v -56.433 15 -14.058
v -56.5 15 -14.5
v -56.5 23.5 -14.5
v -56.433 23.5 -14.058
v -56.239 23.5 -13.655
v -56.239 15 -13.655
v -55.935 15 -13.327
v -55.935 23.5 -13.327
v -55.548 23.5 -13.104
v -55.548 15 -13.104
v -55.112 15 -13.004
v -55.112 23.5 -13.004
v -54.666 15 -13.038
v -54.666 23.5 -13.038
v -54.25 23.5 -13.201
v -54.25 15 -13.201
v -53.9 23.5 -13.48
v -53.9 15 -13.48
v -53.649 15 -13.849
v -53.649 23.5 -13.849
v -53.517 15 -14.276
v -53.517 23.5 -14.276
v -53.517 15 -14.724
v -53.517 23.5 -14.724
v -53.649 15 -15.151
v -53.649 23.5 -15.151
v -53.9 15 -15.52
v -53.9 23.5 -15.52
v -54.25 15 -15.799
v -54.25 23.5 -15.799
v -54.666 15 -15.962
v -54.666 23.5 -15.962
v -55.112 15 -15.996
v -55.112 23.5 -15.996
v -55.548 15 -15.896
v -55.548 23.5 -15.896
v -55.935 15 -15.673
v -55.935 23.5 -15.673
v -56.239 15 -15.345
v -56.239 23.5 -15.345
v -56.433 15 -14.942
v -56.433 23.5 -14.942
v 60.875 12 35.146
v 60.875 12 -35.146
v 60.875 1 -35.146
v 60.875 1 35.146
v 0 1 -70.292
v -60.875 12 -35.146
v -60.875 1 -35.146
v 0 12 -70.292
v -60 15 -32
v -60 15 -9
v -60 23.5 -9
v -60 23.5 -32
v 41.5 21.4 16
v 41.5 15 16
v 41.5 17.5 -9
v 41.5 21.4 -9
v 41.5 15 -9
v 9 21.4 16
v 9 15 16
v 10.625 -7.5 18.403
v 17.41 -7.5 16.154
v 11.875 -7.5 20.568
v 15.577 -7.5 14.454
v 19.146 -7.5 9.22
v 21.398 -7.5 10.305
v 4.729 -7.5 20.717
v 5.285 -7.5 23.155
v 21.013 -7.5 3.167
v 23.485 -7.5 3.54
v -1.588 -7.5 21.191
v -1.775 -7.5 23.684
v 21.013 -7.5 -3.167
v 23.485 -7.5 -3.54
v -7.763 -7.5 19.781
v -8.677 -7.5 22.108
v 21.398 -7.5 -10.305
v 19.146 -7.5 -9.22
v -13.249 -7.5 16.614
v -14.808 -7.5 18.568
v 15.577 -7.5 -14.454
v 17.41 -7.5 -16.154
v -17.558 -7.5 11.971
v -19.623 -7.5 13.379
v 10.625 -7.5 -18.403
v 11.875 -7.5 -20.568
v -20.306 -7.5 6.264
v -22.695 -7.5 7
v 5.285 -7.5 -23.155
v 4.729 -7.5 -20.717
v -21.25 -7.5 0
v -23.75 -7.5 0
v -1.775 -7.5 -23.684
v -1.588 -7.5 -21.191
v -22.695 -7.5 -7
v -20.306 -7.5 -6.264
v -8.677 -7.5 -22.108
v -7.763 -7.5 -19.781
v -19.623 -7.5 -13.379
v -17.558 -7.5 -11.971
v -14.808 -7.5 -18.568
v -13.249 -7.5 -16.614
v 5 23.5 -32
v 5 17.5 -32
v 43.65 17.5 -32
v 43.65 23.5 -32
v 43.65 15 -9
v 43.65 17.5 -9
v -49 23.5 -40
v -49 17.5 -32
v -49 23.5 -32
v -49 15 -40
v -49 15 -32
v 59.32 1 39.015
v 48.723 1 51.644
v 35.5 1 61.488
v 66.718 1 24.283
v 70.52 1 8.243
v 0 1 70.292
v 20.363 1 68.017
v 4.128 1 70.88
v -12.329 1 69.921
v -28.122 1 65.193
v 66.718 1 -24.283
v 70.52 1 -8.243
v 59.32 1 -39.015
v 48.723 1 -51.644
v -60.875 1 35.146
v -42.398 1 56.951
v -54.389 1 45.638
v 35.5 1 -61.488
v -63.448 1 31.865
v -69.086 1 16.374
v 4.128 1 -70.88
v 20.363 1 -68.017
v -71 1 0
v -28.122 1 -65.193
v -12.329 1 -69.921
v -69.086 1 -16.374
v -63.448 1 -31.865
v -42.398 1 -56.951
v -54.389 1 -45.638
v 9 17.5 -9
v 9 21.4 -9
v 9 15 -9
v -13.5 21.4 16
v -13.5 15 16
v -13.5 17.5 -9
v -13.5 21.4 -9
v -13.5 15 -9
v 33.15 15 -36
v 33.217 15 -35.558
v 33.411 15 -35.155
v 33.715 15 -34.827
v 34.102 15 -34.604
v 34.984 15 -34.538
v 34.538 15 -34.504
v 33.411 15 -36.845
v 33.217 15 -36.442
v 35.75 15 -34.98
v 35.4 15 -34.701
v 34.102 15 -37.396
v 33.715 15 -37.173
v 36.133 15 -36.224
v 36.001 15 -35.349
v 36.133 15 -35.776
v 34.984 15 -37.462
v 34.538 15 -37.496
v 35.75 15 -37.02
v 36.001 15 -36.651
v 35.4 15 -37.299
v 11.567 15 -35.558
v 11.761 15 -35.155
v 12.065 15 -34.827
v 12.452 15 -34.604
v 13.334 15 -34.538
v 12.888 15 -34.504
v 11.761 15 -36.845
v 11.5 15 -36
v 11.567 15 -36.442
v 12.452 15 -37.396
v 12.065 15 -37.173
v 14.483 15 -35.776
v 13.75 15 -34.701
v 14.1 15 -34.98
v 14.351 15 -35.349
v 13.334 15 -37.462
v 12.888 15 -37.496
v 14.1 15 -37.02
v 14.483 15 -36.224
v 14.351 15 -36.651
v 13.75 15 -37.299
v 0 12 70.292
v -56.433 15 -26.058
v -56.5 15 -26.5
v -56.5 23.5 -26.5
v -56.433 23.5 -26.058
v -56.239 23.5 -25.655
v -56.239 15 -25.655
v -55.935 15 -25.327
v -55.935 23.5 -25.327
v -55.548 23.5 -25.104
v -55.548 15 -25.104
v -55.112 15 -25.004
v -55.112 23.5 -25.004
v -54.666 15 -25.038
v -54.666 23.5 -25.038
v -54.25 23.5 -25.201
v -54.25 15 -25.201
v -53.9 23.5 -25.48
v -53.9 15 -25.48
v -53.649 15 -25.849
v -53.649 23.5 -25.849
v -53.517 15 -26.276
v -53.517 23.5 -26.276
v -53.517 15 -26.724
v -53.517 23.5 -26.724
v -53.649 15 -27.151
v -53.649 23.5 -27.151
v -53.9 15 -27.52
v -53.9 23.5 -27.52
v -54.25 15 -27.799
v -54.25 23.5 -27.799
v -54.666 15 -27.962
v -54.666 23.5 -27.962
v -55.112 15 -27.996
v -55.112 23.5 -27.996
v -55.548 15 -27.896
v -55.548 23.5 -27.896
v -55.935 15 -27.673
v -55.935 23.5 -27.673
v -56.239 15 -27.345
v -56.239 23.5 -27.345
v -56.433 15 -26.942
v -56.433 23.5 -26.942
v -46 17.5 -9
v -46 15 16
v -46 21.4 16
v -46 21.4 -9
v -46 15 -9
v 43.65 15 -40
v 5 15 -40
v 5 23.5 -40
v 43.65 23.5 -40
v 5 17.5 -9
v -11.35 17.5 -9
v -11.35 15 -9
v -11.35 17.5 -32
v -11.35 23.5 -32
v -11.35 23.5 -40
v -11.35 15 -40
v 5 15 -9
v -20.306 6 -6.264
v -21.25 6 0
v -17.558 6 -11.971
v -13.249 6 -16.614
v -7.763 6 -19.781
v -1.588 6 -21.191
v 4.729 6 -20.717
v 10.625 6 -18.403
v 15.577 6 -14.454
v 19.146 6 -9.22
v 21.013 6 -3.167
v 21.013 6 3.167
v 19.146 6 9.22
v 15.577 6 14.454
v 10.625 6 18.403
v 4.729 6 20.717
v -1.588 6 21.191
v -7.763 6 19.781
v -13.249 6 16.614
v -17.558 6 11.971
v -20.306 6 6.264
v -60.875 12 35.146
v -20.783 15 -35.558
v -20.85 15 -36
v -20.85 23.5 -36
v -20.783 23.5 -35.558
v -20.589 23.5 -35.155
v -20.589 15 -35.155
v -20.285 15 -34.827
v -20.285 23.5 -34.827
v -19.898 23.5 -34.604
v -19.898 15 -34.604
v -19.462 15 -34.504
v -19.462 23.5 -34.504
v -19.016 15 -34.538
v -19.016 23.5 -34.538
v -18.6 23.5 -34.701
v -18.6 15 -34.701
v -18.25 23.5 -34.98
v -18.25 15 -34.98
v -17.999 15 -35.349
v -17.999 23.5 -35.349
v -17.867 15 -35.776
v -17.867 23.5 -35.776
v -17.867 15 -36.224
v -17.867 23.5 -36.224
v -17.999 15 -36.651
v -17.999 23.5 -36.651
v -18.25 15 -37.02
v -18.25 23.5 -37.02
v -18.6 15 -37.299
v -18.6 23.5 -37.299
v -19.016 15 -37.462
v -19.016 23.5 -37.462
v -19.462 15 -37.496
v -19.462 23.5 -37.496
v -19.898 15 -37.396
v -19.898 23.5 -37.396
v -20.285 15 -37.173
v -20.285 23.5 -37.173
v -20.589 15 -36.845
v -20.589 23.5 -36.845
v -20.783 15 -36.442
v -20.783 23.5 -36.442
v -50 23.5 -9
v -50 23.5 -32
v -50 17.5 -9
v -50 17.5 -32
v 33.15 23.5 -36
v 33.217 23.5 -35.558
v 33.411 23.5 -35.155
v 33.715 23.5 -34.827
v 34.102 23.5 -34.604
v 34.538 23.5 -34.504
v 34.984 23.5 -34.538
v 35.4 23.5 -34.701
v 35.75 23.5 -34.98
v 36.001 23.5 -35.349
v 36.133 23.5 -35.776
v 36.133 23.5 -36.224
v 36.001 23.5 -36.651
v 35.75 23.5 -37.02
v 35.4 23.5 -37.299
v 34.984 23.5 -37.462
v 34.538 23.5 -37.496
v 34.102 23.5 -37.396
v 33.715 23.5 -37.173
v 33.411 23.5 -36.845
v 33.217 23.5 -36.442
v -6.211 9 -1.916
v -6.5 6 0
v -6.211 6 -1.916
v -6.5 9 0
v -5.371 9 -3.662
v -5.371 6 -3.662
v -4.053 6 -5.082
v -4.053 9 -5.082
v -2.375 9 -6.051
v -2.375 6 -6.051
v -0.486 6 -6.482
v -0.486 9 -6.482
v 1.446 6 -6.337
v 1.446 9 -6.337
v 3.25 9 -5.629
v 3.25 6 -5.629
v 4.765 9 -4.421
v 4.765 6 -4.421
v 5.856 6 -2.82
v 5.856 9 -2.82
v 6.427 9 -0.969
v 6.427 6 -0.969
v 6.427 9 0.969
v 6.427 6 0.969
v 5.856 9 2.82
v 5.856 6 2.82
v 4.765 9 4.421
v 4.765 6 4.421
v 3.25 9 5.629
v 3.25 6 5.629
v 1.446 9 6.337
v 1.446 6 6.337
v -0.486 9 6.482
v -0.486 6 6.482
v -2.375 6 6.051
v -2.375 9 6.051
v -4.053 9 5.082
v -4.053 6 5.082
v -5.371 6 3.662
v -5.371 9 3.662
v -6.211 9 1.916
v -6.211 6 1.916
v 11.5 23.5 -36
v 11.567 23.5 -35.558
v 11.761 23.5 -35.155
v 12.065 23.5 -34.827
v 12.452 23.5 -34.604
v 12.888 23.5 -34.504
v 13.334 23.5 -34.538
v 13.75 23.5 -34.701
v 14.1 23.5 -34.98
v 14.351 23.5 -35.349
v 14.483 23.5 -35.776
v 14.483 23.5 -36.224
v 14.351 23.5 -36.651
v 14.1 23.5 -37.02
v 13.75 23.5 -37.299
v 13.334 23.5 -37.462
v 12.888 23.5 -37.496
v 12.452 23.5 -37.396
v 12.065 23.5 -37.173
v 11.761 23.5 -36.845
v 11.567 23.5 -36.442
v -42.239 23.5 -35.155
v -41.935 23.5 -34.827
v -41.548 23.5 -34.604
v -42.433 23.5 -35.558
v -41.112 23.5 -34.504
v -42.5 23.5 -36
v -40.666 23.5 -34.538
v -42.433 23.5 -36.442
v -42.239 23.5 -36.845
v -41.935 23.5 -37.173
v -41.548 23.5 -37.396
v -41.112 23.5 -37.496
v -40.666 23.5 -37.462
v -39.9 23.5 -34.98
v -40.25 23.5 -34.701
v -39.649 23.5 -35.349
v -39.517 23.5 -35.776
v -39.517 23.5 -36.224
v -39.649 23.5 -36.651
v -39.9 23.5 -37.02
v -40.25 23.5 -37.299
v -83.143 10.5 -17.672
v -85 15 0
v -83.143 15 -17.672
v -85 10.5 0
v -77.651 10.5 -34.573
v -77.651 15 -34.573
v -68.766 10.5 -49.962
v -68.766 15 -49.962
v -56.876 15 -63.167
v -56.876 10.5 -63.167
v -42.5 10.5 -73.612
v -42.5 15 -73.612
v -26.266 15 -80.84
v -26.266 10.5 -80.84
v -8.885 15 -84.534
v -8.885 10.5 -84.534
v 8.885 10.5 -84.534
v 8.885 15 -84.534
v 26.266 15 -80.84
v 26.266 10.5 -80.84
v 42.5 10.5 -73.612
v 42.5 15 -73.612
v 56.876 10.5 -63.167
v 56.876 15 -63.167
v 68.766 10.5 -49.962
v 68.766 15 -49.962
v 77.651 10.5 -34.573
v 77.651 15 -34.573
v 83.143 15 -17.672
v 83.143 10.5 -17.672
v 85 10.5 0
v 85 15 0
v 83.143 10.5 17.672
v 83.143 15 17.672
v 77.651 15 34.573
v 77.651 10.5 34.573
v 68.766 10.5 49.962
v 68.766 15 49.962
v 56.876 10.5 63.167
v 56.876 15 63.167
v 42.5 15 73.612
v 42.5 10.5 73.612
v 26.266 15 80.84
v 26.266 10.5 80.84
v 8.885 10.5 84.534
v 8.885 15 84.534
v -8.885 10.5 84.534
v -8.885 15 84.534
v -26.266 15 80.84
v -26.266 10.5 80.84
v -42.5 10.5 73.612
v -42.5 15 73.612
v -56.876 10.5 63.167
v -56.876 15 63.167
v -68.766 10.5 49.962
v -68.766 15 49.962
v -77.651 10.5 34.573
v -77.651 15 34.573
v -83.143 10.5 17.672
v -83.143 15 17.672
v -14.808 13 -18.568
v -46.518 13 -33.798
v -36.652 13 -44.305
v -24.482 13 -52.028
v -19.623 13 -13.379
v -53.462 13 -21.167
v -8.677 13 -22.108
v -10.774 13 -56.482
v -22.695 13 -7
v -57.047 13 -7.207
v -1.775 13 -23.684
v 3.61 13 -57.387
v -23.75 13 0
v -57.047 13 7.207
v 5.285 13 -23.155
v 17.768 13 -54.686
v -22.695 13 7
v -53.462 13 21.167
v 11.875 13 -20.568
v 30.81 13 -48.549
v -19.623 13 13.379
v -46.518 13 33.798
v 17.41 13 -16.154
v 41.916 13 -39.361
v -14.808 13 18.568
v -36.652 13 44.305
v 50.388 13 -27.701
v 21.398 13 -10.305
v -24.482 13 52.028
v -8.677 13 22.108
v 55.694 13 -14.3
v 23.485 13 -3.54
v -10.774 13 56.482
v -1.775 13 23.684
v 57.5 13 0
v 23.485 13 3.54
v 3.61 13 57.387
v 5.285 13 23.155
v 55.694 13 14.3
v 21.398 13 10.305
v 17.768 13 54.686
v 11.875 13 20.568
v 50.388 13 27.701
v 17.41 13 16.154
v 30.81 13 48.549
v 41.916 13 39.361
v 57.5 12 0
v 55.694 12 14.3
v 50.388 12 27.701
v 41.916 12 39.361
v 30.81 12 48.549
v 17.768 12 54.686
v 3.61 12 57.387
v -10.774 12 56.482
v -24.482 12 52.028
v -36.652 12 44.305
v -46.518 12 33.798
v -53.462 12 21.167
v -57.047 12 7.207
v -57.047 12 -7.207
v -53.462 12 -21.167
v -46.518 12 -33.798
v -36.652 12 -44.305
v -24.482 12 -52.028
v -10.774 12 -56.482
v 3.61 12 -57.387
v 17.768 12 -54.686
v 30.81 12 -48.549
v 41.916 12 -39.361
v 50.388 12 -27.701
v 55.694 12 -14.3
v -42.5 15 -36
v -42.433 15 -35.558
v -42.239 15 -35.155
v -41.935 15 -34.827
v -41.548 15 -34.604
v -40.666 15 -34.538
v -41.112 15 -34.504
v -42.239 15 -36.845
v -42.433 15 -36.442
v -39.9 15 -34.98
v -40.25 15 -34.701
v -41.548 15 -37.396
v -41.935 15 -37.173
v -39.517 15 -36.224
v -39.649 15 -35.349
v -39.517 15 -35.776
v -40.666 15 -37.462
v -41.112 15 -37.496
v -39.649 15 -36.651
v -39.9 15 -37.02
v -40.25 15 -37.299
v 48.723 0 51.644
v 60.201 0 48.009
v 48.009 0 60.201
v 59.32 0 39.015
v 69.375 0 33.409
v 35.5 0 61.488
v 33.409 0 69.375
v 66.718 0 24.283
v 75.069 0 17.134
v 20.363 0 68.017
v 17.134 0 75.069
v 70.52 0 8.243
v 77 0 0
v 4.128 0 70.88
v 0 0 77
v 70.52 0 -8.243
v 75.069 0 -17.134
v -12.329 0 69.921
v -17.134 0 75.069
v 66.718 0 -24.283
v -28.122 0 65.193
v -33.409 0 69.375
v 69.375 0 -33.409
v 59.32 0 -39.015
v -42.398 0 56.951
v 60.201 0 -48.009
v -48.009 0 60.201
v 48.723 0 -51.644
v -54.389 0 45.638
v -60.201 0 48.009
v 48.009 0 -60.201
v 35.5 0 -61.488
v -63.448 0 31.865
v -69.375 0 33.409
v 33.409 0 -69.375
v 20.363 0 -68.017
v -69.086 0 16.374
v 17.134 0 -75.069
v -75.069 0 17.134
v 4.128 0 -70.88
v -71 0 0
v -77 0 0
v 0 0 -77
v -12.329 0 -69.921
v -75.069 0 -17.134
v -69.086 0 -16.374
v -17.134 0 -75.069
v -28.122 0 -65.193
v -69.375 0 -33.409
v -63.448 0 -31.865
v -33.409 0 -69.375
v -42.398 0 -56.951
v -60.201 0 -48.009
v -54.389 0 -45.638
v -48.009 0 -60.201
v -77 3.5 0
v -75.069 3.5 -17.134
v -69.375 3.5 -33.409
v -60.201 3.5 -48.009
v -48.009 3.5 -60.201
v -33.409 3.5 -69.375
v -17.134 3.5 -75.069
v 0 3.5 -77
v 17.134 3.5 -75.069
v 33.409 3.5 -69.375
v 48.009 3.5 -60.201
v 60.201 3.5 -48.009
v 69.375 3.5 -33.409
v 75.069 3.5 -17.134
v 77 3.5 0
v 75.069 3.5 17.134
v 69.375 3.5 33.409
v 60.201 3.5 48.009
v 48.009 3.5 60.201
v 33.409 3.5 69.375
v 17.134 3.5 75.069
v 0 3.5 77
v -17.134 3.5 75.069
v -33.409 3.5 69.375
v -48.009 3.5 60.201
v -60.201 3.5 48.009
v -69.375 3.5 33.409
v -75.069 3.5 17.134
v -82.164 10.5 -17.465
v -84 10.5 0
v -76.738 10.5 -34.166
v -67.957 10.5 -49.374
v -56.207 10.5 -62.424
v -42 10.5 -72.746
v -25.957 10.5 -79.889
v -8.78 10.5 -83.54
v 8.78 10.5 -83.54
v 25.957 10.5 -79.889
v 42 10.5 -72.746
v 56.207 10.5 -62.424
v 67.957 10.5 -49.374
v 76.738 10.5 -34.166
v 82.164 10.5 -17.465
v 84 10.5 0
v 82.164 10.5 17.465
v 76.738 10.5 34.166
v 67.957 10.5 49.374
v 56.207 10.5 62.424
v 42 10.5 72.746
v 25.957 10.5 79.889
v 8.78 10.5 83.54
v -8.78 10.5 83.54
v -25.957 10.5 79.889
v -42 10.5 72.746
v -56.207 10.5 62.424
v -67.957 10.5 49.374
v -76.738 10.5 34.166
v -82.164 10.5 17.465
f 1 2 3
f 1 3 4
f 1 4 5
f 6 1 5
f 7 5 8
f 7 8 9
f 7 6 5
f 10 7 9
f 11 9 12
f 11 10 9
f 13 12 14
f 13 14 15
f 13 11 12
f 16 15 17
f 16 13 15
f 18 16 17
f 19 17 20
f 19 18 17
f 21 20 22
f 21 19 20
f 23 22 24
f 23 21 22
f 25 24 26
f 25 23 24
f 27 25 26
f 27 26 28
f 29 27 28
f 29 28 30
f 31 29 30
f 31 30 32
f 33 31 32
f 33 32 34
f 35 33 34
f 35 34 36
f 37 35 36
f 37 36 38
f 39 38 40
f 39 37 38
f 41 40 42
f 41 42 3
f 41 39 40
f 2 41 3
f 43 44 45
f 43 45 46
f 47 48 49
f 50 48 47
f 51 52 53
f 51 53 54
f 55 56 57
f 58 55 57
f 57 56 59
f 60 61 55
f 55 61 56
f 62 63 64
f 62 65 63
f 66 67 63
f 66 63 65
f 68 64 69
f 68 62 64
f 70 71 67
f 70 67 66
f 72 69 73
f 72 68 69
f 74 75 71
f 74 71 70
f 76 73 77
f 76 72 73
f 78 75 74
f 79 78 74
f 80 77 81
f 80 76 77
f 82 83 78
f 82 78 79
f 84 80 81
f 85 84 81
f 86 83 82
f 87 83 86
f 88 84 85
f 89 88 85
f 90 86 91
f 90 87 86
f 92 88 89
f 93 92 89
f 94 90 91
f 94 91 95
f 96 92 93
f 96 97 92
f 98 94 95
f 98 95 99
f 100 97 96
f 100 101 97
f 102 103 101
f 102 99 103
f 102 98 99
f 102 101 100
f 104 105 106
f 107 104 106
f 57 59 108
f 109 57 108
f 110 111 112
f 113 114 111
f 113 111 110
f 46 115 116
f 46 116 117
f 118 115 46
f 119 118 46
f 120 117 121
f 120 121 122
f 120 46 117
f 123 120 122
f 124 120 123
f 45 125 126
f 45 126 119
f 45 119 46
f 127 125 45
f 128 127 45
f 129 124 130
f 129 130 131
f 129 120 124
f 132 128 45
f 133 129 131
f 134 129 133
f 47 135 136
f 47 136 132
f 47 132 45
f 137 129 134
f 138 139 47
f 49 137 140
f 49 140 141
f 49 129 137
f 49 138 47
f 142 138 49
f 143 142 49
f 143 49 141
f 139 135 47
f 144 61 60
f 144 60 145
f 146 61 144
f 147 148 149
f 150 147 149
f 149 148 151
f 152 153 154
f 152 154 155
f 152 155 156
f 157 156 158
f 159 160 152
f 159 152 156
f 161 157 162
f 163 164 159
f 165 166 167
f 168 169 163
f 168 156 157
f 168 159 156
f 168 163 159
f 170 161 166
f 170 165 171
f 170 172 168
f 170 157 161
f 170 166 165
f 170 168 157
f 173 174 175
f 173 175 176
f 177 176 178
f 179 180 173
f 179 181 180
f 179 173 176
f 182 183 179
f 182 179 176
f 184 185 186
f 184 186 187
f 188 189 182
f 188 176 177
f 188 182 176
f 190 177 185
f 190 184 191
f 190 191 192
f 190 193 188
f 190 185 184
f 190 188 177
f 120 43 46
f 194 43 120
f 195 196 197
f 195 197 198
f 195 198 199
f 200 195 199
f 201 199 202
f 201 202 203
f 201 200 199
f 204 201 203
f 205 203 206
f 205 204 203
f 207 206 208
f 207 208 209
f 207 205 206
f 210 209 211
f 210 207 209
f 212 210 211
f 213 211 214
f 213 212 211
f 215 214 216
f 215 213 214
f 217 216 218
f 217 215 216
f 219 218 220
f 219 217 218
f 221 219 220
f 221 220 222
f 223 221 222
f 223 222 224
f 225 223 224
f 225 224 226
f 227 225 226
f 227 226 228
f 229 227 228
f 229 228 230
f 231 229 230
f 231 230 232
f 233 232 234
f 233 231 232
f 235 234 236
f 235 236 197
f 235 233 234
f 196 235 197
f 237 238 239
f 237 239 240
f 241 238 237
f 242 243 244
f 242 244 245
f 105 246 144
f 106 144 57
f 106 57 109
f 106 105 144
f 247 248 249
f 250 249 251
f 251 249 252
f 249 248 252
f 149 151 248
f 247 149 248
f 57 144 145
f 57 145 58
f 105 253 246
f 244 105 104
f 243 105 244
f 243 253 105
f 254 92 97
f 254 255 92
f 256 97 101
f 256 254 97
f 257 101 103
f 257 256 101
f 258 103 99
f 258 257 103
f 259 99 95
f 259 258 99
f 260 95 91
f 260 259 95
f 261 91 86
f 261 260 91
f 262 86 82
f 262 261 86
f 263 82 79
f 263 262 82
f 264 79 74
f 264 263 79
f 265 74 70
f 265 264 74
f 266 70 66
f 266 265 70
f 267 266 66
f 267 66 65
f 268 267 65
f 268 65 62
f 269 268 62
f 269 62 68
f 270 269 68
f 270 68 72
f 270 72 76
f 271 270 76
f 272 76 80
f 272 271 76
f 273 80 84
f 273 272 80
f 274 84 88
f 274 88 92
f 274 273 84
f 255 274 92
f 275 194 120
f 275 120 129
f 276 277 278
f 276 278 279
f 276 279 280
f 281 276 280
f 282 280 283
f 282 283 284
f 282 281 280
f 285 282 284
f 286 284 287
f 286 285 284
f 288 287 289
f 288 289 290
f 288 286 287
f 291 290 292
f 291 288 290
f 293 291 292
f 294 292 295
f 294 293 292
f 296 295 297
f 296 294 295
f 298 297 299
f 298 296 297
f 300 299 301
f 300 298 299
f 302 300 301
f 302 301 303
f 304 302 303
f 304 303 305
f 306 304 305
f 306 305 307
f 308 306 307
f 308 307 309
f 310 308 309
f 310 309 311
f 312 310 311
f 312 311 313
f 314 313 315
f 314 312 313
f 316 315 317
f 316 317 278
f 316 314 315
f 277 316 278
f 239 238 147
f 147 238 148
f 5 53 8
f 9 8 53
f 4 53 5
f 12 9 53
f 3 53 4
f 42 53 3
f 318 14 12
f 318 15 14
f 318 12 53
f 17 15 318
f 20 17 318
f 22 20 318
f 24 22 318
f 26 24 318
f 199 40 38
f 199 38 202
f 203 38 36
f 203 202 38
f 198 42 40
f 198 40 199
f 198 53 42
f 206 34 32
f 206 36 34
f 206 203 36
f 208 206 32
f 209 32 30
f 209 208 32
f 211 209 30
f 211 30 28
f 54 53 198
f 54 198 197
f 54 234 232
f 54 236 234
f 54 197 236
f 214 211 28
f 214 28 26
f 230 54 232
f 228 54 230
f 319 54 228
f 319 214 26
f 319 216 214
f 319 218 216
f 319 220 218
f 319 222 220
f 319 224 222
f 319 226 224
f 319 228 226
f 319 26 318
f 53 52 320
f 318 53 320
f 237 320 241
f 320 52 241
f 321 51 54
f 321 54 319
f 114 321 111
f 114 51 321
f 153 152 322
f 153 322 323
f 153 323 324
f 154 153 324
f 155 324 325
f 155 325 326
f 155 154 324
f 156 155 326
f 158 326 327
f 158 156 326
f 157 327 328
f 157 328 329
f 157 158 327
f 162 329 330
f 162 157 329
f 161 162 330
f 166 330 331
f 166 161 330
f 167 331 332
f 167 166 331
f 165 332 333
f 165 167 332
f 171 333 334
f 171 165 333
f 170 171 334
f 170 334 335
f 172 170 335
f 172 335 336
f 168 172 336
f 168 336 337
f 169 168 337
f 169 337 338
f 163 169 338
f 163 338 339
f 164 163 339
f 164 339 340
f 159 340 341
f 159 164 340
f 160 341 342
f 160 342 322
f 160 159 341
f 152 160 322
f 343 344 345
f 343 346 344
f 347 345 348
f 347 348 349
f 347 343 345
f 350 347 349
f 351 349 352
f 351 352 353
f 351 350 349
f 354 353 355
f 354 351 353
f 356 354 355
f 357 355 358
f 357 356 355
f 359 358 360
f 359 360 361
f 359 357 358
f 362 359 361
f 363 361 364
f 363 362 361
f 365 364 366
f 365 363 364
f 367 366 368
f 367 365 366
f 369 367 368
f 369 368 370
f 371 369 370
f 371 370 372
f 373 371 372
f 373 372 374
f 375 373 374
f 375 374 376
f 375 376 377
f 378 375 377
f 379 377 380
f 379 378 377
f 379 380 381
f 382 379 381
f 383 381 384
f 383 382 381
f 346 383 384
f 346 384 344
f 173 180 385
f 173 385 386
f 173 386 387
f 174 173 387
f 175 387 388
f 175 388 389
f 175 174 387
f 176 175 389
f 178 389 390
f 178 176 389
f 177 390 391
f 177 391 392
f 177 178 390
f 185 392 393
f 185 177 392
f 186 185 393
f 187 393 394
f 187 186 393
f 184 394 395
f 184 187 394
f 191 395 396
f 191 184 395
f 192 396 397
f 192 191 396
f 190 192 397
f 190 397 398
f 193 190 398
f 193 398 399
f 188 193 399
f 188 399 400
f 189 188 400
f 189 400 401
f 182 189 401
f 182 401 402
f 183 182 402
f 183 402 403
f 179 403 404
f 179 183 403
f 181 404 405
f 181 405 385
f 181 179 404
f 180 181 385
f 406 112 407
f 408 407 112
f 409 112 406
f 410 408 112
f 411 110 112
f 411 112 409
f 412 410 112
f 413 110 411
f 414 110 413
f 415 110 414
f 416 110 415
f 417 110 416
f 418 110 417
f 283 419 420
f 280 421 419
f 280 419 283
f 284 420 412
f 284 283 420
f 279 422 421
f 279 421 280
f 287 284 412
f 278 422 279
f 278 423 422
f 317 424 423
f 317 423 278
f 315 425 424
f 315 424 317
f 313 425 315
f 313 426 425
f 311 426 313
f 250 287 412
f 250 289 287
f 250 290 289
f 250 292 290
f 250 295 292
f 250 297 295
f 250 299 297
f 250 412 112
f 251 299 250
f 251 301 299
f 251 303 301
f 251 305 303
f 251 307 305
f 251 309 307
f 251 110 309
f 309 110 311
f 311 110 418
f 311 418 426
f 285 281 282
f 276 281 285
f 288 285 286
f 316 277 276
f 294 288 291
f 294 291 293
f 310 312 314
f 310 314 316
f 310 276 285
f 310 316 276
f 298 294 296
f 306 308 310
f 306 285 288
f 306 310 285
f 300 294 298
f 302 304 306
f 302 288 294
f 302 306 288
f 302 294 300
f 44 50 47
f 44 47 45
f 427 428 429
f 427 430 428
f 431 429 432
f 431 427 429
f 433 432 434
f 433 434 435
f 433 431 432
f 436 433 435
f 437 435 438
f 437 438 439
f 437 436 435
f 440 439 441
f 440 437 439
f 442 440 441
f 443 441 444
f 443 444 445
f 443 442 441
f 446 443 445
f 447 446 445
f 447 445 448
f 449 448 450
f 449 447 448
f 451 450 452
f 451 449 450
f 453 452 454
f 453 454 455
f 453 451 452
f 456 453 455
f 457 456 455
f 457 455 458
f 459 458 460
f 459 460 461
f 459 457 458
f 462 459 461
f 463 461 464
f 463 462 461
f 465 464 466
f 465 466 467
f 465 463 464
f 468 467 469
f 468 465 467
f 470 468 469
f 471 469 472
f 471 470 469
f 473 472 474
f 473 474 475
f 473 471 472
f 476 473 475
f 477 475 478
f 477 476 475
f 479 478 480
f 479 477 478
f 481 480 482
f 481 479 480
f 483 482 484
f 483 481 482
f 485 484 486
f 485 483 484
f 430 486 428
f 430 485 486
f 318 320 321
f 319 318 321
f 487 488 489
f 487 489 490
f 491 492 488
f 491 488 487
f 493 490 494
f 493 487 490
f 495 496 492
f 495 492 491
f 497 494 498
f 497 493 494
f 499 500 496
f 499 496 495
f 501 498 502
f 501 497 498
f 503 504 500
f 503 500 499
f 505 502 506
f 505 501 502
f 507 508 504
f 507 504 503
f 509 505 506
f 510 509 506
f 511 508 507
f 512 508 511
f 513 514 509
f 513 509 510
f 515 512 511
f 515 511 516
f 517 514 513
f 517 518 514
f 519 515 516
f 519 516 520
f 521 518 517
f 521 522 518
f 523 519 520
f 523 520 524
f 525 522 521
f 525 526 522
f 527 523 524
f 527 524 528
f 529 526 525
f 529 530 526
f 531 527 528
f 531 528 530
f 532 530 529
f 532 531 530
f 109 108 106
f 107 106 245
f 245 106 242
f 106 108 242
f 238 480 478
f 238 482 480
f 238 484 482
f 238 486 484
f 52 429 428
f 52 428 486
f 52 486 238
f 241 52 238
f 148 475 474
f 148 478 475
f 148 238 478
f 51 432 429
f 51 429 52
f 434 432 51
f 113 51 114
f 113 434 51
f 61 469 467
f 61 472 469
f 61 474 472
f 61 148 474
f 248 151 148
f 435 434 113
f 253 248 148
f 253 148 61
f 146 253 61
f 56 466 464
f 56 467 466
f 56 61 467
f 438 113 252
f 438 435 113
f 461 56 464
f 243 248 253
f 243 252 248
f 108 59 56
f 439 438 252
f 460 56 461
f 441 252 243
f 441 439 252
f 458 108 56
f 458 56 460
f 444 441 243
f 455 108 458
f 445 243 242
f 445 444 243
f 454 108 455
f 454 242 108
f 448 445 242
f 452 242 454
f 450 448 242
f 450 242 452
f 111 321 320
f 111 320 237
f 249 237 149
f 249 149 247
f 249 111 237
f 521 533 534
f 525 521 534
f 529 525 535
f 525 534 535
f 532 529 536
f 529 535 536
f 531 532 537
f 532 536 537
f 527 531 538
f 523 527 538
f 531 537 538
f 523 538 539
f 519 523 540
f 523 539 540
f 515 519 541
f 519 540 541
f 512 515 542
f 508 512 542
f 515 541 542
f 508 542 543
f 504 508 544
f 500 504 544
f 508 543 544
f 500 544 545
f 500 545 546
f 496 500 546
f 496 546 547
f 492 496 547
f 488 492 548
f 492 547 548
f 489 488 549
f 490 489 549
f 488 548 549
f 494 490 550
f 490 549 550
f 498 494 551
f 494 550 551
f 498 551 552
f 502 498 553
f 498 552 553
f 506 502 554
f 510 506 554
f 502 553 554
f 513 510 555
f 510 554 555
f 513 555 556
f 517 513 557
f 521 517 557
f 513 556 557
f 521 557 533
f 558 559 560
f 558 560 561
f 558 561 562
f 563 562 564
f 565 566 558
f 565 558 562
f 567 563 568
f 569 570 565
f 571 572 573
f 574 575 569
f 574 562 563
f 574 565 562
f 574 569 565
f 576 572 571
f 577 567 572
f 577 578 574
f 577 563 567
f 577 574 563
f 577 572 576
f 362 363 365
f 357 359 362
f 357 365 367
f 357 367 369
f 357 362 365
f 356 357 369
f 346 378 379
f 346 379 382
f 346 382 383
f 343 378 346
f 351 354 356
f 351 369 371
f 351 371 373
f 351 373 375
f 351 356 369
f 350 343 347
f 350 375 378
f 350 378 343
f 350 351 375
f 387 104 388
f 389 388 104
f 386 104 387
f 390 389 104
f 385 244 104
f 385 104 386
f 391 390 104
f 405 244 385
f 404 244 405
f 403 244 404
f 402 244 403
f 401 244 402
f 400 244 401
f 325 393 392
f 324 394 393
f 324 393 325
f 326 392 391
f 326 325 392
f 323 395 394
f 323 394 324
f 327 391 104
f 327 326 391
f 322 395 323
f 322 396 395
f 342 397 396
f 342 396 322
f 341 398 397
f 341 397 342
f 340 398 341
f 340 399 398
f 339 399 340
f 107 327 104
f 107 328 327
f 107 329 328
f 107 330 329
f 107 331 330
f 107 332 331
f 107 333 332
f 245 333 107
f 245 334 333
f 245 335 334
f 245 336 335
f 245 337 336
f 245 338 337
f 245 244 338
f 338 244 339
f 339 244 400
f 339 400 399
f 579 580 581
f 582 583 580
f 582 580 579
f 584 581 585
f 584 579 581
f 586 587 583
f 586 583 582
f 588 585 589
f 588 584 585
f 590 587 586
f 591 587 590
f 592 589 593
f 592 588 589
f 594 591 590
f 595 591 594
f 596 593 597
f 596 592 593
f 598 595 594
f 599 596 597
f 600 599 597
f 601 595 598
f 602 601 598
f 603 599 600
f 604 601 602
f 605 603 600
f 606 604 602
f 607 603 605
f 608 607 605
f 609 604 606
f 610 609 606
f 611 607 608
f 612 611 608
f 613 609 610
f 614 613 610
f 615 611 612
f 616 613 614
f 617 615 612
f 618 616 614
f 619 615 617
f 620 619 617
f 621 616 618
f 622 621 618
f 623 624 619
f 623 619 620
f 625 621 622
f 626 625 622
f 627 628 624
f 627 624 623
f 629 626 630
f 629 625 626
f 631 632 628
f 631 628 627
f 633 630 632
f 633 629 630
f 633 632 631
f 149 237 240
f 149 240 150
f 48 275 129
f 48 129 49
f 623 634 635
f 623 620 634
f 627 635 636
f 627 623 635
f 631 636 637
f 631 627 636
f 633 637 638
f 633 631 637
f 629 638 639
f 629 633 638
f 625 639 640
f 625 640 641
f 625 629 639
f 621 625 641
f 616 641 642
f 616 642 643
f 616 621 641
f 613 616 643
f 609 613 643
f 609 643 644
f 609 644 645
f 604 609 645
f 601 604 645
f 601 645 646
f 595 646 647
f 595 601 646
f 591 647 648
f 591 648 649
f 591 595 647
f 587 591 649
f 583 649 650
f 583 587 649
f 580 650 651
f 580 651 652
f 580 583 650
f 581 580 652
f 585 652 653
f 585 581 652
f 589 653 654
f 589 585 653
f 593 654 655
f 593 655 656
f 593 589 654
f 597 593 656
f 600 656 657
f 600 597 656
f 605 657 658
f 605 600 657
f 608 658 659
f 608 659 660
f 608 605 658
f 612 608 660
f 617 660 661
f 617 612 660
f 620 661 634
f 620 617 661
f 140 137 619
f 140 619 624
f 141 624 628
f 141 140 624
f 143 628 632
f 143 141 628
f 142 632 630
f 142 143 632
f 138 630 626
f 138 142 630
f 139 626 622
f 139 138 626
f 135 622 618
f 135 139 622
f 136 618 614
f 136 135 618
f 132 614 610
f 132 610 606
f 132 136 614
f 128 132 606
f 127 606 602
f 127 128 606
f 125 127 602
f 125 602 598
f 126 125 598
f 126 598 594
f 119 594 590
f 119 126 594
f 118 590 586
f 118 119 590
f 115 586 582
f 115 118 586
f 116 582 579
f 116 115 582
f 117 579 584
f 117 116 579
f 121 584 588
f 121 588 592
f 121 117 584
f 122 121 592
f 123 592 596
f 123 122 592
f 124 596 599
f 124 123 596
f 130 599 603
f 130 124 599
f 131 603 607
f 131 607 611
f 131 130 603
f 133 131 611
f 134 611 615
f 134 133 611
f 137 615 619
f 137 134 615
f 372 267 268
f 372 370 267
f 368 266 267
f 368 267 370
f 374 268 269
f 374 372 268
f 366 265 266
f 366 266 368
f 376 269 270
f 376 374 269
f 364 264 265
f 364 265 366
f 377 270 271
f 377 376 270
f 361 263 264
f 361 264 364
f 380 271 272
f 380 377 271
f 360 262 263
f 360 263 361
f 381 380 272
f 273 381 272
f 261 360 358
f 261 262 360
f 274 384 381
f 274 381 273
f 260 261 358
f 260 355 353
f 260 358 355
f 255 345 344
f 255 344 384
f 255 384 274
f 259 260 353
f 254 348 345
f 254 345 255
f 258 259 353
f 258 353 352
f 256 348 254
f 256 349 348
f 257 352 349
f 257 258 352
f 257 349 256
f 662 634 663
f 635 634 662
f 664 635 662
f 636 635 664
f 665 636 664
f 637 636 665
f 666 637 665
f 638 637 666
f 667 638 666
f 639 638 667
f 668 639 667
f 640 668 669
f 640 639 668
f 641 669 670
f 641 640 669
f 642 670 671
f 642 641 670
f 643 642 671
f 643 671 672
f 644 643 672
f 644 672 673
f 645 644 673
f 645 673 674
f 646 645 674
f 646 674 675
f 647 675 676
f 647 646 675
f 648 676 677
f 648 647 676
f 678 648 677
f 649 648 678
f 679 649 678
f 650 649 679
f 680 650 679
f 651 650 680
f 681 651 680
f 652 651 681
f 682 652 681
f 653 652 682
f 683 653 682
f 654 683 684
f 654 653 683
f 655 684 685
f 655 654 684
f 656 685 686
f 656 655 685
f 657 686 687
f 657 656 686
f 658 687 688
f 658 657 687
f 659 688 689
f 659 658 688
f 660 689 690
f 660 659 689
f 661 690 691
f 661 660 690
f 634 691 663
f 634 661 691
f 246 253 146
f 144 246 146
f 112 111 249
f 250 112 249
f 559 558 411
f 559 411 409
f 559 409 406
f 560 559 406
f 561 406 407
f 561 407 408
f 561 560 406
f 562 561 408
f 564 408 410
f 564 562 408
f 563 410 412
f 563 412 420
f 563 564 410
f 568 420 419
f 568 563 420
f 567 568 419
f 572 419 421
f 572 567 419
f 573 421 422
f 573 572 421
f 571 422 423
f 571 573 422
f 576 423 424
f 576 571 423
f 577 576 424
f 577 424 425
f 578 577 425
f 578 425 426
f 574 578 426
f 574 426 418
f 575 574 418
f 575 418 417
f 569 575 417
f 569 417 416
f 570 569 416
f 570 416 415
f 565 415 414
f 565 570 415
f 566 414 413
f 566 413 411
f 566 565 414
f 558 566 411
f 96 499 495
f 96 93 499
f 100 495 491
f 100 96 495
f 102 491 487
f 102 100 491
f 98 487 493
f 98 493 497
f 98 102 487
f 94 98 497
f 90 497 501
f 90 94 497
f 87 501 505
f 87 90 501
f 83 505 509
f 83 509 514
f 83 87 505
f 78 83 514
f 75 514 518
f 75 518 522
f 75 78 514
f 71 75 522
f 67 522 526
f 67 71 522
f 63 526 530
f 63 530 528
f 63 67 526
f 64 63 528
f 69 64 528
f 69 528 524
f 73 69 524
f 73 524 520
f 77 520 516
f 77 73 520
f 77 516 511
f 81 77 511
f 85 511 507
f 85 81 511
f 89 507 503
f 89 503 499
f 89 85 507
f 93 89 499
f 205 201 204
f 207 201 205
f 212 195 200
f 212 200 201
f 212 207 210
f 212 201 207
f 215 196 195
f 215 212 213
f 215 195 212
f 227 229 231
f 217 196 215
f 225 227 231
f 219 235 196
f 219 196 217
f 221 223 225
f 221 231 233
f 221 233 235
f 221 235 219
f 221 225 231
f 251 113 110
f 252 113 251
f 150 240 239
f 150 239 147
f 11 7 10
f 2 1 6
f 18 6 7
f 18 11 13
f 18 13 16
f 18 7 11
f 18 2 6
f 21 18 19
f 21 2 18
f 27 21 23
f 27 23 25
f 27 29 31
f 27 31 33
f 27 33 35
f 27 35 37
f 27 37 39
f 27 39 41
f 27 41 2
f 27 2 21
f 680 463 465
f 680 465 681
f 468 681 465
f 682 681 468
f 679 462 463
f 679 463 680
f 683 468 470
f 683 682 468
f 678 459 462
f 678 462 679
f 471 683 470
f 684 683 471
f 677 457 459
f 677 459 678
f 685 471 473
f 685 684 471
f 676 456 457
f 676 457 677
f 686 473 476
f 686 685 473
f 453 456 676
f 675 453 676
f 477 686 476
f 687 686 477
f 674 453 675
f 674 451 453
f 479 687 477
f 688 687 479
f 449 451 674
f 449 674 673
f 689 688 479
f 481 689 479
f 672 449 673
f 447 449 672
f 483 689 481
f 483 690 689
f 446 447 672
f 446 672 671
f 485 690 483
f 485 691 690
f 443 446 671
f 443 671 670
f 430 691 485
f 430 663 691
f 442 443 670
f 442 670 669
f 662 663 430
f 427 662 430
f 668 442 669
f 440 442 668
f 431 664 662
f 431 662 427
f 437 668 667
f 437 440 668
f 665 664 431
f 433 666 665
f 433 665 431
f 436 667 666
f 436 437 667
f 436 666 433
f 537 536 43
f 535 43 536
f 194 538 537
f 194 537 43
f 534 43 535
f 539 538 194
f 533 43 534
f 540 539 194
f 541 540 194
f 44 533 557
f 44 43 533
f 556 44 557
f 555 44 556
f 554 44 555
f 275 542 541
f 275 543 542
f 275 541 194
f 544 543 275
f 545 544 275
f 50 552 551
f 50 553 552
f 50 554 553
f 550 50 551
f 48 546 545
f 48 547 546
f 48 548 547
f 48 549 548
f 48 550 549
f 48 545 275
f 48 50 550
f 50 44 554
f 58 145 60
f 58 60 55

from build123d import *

# Parameters (mm, degrees)
SKETCH2_R           = 71
BOSS_EXTRUDE1_DEPTH = 11
SKETCH10_W          = 37.65
SKETCH10_H          = 8
SKETCH10_R          = 1.5
SKETCH10_W_2        = 10
SKETCH10_H_2        = 23
SKETCH10_W_3        = 1
BOSS_EXTRUDE6_DEPTH = 8.5
SKETCH12_R          = 57.5
SKETCH12_R_2        = 23.75
CUT_EXTRUDE8_DEPTH  = 1
SKETCH11_W          = 38.65
SKETCH11_H          = 23
BOSS_EXTRUDE7_DEPTH = 2.5
SKETCH14_W          = 32.5
SKETCH14_H          = 25
BOSS_EXTRUDE8_DEPTH = 6.4


with BuildPart() as part:
    # Sketch1 → Revolve1 (revolve)
    with BuildSketch(Plane.XY, mode=Mode.PRIVATE) as revolve1_sk:
        Polygon((0, 12), (0, 15), (85, 15), (85, 10.5), (84, 10.5), (77, 3.5), (77, 0), (71, 0), (71, 12), (23.75, 12), (23.75, -7.5), (21.25, -7.5), (21.25, 6), (6.5, 6), (6.5, 9), (0, 9), align=None)
    revolve(revolve1_sk.sketch.rotate(Axis((0, 12, 0), (0, -1, 0)), 180), axis=Axis((0, 12, 0), (0, -1, 0)))

    # Sketch2 → Boss-Extrude1 (add)
    with BuildSketch(Plane.XZ.offset(-12)):
        with Locations(Location((0, 0, 0), (0, 0, 180))):
            Circle(SKETCH2_R)
        Polygon((0, 70.292395274), (-60.875, 35.146197637), (-60.875, -35.146197637), (0, -70.292395274), (60.875, -35.146197637), (60.875, 35.146197637), align=None, mode=Mode.SUBTRACT)
    extrude(amount=BOSS_EXTRUDE1_DEPTH)

    # Sketch10 → Boss-Extrude6 (add)
    # profile 1 of 4: a face of its own
    with BuildSketch(Plane(origin=(0, 15, 0), x_dir=(1, 0, 0), z_dir=(0, 1, 0))):
        with Locations((-30.175, 36)):
            Rectangle(SKETCH10_W, SKETCH10_H)
        with Locations(Location((-41, 36, 0), (0, 0, 180))):
            Circle(SKETCH10_R, mode=Mode.SUBTRACT)
        with Locations(Location((-19.35, 36, 0), (0, 0, 180))):
            Circle(SKETCH10_R, mode=Mode.SUBTRACT)
    # profile 2 of 4: a face of its own
    with BuildSketch(Plane(origin=(0, 15, 0), x_dir=(1, 0, 0), z_dir=(0, 1, 0))):
        with Locations((-55, 20.5)):
            Rectangle(SKETCH10_W_2, SKETCH10_H_2)
        with Locations(Location((-55, 14.5, 0), (0, 0, 180))):
            Circle(SKETCH10_R, mode=Mode.SUBTRACT)
        with Locations(Location((-55, 26.5, 0), (0, 0, 180))):
            Circle(SKETCH10_R, mode=Mode.SUBTRACT)
    # profile 3 of 4: a face of its own
    with BuildSketch(Plane(origin=(0, 15, 0), x_dir=(1, 0, 0), z_dir=(0, 1, 0))):
        with Locations((23.825, 36)):
            Rectangle(SKETCH10_W, SKETCH10_H)
        with Locations(Location((13, 36, 0), (0, 0, 180))):
            Circle(SKETCH10_R, mode=Mode.SUBTRACT)
        with Locations(Location((34.65, 36, 0), (0, 0, 180))):
            Circle(SKETCH10_R, mode=Mode.SUBTRACT)
    # profile 4 of 4: a face of its own
    with BuildSketch(Plane(origin=(0, 15, 0), x_dir=(1, 0, 0), z_dir=(0, 1, 0))):
        with Locations((43.15, 36)):
            Rectangle(SKETCH10_W_3, SKETCH10_H)
    extrude(amount=BOSS_EXTRUDE6_DEPTH)

    # Sketch12 → Cut-Extrude8 (cut)
    with BuildSketch(Plane.XZ.offset(-12)):
        Circle(SKETCH12_R)
        with Locations(Location((0, 0, 0), (0, 0, 180))):
            Circle(SKETCH12_R_2, mode=Mode.SUBTRACT)
    extrude(amount=-CUT_EXTRUDE8_DEPTH, mode=Mode.SUBTRACT)

    # Sketch11 → Boss-Extrude7 (add)
    with BuildSketch(Plane(origin=(0, 15, 0), x_dir=(1, 0, 0), z_dir=(0, 1, 0))):
        with Locations((-30.675, 20.5)):
            Rectangle(SKETCH11_W, SKETCH11_H)
        with Locations((24.325, 20.5)):
            Rectangle(SKETCH11_W, SKETCH11_H)
    extrude(amount=BOSS_EXTRUDE7_DEPTH)

    # Sketch14 → Boss-Extrude8 (add)
    with BuildSketch(Plane(origin=(0, 15, 0), x_dir=(1, 0, 0), z_dir=(0, 1, 0))):
        with Locations((-29.75, -3.5)):
            Rectangle(SKETCH14_W, SKETCH14_H)
        with Locations((25.25, -3.5)):
            Rectangle(SKETCH14_W, SKETCH14_H)
    extrude(amount=BOSS_EXTRUDE8_DEPTH)


solid = part.part
